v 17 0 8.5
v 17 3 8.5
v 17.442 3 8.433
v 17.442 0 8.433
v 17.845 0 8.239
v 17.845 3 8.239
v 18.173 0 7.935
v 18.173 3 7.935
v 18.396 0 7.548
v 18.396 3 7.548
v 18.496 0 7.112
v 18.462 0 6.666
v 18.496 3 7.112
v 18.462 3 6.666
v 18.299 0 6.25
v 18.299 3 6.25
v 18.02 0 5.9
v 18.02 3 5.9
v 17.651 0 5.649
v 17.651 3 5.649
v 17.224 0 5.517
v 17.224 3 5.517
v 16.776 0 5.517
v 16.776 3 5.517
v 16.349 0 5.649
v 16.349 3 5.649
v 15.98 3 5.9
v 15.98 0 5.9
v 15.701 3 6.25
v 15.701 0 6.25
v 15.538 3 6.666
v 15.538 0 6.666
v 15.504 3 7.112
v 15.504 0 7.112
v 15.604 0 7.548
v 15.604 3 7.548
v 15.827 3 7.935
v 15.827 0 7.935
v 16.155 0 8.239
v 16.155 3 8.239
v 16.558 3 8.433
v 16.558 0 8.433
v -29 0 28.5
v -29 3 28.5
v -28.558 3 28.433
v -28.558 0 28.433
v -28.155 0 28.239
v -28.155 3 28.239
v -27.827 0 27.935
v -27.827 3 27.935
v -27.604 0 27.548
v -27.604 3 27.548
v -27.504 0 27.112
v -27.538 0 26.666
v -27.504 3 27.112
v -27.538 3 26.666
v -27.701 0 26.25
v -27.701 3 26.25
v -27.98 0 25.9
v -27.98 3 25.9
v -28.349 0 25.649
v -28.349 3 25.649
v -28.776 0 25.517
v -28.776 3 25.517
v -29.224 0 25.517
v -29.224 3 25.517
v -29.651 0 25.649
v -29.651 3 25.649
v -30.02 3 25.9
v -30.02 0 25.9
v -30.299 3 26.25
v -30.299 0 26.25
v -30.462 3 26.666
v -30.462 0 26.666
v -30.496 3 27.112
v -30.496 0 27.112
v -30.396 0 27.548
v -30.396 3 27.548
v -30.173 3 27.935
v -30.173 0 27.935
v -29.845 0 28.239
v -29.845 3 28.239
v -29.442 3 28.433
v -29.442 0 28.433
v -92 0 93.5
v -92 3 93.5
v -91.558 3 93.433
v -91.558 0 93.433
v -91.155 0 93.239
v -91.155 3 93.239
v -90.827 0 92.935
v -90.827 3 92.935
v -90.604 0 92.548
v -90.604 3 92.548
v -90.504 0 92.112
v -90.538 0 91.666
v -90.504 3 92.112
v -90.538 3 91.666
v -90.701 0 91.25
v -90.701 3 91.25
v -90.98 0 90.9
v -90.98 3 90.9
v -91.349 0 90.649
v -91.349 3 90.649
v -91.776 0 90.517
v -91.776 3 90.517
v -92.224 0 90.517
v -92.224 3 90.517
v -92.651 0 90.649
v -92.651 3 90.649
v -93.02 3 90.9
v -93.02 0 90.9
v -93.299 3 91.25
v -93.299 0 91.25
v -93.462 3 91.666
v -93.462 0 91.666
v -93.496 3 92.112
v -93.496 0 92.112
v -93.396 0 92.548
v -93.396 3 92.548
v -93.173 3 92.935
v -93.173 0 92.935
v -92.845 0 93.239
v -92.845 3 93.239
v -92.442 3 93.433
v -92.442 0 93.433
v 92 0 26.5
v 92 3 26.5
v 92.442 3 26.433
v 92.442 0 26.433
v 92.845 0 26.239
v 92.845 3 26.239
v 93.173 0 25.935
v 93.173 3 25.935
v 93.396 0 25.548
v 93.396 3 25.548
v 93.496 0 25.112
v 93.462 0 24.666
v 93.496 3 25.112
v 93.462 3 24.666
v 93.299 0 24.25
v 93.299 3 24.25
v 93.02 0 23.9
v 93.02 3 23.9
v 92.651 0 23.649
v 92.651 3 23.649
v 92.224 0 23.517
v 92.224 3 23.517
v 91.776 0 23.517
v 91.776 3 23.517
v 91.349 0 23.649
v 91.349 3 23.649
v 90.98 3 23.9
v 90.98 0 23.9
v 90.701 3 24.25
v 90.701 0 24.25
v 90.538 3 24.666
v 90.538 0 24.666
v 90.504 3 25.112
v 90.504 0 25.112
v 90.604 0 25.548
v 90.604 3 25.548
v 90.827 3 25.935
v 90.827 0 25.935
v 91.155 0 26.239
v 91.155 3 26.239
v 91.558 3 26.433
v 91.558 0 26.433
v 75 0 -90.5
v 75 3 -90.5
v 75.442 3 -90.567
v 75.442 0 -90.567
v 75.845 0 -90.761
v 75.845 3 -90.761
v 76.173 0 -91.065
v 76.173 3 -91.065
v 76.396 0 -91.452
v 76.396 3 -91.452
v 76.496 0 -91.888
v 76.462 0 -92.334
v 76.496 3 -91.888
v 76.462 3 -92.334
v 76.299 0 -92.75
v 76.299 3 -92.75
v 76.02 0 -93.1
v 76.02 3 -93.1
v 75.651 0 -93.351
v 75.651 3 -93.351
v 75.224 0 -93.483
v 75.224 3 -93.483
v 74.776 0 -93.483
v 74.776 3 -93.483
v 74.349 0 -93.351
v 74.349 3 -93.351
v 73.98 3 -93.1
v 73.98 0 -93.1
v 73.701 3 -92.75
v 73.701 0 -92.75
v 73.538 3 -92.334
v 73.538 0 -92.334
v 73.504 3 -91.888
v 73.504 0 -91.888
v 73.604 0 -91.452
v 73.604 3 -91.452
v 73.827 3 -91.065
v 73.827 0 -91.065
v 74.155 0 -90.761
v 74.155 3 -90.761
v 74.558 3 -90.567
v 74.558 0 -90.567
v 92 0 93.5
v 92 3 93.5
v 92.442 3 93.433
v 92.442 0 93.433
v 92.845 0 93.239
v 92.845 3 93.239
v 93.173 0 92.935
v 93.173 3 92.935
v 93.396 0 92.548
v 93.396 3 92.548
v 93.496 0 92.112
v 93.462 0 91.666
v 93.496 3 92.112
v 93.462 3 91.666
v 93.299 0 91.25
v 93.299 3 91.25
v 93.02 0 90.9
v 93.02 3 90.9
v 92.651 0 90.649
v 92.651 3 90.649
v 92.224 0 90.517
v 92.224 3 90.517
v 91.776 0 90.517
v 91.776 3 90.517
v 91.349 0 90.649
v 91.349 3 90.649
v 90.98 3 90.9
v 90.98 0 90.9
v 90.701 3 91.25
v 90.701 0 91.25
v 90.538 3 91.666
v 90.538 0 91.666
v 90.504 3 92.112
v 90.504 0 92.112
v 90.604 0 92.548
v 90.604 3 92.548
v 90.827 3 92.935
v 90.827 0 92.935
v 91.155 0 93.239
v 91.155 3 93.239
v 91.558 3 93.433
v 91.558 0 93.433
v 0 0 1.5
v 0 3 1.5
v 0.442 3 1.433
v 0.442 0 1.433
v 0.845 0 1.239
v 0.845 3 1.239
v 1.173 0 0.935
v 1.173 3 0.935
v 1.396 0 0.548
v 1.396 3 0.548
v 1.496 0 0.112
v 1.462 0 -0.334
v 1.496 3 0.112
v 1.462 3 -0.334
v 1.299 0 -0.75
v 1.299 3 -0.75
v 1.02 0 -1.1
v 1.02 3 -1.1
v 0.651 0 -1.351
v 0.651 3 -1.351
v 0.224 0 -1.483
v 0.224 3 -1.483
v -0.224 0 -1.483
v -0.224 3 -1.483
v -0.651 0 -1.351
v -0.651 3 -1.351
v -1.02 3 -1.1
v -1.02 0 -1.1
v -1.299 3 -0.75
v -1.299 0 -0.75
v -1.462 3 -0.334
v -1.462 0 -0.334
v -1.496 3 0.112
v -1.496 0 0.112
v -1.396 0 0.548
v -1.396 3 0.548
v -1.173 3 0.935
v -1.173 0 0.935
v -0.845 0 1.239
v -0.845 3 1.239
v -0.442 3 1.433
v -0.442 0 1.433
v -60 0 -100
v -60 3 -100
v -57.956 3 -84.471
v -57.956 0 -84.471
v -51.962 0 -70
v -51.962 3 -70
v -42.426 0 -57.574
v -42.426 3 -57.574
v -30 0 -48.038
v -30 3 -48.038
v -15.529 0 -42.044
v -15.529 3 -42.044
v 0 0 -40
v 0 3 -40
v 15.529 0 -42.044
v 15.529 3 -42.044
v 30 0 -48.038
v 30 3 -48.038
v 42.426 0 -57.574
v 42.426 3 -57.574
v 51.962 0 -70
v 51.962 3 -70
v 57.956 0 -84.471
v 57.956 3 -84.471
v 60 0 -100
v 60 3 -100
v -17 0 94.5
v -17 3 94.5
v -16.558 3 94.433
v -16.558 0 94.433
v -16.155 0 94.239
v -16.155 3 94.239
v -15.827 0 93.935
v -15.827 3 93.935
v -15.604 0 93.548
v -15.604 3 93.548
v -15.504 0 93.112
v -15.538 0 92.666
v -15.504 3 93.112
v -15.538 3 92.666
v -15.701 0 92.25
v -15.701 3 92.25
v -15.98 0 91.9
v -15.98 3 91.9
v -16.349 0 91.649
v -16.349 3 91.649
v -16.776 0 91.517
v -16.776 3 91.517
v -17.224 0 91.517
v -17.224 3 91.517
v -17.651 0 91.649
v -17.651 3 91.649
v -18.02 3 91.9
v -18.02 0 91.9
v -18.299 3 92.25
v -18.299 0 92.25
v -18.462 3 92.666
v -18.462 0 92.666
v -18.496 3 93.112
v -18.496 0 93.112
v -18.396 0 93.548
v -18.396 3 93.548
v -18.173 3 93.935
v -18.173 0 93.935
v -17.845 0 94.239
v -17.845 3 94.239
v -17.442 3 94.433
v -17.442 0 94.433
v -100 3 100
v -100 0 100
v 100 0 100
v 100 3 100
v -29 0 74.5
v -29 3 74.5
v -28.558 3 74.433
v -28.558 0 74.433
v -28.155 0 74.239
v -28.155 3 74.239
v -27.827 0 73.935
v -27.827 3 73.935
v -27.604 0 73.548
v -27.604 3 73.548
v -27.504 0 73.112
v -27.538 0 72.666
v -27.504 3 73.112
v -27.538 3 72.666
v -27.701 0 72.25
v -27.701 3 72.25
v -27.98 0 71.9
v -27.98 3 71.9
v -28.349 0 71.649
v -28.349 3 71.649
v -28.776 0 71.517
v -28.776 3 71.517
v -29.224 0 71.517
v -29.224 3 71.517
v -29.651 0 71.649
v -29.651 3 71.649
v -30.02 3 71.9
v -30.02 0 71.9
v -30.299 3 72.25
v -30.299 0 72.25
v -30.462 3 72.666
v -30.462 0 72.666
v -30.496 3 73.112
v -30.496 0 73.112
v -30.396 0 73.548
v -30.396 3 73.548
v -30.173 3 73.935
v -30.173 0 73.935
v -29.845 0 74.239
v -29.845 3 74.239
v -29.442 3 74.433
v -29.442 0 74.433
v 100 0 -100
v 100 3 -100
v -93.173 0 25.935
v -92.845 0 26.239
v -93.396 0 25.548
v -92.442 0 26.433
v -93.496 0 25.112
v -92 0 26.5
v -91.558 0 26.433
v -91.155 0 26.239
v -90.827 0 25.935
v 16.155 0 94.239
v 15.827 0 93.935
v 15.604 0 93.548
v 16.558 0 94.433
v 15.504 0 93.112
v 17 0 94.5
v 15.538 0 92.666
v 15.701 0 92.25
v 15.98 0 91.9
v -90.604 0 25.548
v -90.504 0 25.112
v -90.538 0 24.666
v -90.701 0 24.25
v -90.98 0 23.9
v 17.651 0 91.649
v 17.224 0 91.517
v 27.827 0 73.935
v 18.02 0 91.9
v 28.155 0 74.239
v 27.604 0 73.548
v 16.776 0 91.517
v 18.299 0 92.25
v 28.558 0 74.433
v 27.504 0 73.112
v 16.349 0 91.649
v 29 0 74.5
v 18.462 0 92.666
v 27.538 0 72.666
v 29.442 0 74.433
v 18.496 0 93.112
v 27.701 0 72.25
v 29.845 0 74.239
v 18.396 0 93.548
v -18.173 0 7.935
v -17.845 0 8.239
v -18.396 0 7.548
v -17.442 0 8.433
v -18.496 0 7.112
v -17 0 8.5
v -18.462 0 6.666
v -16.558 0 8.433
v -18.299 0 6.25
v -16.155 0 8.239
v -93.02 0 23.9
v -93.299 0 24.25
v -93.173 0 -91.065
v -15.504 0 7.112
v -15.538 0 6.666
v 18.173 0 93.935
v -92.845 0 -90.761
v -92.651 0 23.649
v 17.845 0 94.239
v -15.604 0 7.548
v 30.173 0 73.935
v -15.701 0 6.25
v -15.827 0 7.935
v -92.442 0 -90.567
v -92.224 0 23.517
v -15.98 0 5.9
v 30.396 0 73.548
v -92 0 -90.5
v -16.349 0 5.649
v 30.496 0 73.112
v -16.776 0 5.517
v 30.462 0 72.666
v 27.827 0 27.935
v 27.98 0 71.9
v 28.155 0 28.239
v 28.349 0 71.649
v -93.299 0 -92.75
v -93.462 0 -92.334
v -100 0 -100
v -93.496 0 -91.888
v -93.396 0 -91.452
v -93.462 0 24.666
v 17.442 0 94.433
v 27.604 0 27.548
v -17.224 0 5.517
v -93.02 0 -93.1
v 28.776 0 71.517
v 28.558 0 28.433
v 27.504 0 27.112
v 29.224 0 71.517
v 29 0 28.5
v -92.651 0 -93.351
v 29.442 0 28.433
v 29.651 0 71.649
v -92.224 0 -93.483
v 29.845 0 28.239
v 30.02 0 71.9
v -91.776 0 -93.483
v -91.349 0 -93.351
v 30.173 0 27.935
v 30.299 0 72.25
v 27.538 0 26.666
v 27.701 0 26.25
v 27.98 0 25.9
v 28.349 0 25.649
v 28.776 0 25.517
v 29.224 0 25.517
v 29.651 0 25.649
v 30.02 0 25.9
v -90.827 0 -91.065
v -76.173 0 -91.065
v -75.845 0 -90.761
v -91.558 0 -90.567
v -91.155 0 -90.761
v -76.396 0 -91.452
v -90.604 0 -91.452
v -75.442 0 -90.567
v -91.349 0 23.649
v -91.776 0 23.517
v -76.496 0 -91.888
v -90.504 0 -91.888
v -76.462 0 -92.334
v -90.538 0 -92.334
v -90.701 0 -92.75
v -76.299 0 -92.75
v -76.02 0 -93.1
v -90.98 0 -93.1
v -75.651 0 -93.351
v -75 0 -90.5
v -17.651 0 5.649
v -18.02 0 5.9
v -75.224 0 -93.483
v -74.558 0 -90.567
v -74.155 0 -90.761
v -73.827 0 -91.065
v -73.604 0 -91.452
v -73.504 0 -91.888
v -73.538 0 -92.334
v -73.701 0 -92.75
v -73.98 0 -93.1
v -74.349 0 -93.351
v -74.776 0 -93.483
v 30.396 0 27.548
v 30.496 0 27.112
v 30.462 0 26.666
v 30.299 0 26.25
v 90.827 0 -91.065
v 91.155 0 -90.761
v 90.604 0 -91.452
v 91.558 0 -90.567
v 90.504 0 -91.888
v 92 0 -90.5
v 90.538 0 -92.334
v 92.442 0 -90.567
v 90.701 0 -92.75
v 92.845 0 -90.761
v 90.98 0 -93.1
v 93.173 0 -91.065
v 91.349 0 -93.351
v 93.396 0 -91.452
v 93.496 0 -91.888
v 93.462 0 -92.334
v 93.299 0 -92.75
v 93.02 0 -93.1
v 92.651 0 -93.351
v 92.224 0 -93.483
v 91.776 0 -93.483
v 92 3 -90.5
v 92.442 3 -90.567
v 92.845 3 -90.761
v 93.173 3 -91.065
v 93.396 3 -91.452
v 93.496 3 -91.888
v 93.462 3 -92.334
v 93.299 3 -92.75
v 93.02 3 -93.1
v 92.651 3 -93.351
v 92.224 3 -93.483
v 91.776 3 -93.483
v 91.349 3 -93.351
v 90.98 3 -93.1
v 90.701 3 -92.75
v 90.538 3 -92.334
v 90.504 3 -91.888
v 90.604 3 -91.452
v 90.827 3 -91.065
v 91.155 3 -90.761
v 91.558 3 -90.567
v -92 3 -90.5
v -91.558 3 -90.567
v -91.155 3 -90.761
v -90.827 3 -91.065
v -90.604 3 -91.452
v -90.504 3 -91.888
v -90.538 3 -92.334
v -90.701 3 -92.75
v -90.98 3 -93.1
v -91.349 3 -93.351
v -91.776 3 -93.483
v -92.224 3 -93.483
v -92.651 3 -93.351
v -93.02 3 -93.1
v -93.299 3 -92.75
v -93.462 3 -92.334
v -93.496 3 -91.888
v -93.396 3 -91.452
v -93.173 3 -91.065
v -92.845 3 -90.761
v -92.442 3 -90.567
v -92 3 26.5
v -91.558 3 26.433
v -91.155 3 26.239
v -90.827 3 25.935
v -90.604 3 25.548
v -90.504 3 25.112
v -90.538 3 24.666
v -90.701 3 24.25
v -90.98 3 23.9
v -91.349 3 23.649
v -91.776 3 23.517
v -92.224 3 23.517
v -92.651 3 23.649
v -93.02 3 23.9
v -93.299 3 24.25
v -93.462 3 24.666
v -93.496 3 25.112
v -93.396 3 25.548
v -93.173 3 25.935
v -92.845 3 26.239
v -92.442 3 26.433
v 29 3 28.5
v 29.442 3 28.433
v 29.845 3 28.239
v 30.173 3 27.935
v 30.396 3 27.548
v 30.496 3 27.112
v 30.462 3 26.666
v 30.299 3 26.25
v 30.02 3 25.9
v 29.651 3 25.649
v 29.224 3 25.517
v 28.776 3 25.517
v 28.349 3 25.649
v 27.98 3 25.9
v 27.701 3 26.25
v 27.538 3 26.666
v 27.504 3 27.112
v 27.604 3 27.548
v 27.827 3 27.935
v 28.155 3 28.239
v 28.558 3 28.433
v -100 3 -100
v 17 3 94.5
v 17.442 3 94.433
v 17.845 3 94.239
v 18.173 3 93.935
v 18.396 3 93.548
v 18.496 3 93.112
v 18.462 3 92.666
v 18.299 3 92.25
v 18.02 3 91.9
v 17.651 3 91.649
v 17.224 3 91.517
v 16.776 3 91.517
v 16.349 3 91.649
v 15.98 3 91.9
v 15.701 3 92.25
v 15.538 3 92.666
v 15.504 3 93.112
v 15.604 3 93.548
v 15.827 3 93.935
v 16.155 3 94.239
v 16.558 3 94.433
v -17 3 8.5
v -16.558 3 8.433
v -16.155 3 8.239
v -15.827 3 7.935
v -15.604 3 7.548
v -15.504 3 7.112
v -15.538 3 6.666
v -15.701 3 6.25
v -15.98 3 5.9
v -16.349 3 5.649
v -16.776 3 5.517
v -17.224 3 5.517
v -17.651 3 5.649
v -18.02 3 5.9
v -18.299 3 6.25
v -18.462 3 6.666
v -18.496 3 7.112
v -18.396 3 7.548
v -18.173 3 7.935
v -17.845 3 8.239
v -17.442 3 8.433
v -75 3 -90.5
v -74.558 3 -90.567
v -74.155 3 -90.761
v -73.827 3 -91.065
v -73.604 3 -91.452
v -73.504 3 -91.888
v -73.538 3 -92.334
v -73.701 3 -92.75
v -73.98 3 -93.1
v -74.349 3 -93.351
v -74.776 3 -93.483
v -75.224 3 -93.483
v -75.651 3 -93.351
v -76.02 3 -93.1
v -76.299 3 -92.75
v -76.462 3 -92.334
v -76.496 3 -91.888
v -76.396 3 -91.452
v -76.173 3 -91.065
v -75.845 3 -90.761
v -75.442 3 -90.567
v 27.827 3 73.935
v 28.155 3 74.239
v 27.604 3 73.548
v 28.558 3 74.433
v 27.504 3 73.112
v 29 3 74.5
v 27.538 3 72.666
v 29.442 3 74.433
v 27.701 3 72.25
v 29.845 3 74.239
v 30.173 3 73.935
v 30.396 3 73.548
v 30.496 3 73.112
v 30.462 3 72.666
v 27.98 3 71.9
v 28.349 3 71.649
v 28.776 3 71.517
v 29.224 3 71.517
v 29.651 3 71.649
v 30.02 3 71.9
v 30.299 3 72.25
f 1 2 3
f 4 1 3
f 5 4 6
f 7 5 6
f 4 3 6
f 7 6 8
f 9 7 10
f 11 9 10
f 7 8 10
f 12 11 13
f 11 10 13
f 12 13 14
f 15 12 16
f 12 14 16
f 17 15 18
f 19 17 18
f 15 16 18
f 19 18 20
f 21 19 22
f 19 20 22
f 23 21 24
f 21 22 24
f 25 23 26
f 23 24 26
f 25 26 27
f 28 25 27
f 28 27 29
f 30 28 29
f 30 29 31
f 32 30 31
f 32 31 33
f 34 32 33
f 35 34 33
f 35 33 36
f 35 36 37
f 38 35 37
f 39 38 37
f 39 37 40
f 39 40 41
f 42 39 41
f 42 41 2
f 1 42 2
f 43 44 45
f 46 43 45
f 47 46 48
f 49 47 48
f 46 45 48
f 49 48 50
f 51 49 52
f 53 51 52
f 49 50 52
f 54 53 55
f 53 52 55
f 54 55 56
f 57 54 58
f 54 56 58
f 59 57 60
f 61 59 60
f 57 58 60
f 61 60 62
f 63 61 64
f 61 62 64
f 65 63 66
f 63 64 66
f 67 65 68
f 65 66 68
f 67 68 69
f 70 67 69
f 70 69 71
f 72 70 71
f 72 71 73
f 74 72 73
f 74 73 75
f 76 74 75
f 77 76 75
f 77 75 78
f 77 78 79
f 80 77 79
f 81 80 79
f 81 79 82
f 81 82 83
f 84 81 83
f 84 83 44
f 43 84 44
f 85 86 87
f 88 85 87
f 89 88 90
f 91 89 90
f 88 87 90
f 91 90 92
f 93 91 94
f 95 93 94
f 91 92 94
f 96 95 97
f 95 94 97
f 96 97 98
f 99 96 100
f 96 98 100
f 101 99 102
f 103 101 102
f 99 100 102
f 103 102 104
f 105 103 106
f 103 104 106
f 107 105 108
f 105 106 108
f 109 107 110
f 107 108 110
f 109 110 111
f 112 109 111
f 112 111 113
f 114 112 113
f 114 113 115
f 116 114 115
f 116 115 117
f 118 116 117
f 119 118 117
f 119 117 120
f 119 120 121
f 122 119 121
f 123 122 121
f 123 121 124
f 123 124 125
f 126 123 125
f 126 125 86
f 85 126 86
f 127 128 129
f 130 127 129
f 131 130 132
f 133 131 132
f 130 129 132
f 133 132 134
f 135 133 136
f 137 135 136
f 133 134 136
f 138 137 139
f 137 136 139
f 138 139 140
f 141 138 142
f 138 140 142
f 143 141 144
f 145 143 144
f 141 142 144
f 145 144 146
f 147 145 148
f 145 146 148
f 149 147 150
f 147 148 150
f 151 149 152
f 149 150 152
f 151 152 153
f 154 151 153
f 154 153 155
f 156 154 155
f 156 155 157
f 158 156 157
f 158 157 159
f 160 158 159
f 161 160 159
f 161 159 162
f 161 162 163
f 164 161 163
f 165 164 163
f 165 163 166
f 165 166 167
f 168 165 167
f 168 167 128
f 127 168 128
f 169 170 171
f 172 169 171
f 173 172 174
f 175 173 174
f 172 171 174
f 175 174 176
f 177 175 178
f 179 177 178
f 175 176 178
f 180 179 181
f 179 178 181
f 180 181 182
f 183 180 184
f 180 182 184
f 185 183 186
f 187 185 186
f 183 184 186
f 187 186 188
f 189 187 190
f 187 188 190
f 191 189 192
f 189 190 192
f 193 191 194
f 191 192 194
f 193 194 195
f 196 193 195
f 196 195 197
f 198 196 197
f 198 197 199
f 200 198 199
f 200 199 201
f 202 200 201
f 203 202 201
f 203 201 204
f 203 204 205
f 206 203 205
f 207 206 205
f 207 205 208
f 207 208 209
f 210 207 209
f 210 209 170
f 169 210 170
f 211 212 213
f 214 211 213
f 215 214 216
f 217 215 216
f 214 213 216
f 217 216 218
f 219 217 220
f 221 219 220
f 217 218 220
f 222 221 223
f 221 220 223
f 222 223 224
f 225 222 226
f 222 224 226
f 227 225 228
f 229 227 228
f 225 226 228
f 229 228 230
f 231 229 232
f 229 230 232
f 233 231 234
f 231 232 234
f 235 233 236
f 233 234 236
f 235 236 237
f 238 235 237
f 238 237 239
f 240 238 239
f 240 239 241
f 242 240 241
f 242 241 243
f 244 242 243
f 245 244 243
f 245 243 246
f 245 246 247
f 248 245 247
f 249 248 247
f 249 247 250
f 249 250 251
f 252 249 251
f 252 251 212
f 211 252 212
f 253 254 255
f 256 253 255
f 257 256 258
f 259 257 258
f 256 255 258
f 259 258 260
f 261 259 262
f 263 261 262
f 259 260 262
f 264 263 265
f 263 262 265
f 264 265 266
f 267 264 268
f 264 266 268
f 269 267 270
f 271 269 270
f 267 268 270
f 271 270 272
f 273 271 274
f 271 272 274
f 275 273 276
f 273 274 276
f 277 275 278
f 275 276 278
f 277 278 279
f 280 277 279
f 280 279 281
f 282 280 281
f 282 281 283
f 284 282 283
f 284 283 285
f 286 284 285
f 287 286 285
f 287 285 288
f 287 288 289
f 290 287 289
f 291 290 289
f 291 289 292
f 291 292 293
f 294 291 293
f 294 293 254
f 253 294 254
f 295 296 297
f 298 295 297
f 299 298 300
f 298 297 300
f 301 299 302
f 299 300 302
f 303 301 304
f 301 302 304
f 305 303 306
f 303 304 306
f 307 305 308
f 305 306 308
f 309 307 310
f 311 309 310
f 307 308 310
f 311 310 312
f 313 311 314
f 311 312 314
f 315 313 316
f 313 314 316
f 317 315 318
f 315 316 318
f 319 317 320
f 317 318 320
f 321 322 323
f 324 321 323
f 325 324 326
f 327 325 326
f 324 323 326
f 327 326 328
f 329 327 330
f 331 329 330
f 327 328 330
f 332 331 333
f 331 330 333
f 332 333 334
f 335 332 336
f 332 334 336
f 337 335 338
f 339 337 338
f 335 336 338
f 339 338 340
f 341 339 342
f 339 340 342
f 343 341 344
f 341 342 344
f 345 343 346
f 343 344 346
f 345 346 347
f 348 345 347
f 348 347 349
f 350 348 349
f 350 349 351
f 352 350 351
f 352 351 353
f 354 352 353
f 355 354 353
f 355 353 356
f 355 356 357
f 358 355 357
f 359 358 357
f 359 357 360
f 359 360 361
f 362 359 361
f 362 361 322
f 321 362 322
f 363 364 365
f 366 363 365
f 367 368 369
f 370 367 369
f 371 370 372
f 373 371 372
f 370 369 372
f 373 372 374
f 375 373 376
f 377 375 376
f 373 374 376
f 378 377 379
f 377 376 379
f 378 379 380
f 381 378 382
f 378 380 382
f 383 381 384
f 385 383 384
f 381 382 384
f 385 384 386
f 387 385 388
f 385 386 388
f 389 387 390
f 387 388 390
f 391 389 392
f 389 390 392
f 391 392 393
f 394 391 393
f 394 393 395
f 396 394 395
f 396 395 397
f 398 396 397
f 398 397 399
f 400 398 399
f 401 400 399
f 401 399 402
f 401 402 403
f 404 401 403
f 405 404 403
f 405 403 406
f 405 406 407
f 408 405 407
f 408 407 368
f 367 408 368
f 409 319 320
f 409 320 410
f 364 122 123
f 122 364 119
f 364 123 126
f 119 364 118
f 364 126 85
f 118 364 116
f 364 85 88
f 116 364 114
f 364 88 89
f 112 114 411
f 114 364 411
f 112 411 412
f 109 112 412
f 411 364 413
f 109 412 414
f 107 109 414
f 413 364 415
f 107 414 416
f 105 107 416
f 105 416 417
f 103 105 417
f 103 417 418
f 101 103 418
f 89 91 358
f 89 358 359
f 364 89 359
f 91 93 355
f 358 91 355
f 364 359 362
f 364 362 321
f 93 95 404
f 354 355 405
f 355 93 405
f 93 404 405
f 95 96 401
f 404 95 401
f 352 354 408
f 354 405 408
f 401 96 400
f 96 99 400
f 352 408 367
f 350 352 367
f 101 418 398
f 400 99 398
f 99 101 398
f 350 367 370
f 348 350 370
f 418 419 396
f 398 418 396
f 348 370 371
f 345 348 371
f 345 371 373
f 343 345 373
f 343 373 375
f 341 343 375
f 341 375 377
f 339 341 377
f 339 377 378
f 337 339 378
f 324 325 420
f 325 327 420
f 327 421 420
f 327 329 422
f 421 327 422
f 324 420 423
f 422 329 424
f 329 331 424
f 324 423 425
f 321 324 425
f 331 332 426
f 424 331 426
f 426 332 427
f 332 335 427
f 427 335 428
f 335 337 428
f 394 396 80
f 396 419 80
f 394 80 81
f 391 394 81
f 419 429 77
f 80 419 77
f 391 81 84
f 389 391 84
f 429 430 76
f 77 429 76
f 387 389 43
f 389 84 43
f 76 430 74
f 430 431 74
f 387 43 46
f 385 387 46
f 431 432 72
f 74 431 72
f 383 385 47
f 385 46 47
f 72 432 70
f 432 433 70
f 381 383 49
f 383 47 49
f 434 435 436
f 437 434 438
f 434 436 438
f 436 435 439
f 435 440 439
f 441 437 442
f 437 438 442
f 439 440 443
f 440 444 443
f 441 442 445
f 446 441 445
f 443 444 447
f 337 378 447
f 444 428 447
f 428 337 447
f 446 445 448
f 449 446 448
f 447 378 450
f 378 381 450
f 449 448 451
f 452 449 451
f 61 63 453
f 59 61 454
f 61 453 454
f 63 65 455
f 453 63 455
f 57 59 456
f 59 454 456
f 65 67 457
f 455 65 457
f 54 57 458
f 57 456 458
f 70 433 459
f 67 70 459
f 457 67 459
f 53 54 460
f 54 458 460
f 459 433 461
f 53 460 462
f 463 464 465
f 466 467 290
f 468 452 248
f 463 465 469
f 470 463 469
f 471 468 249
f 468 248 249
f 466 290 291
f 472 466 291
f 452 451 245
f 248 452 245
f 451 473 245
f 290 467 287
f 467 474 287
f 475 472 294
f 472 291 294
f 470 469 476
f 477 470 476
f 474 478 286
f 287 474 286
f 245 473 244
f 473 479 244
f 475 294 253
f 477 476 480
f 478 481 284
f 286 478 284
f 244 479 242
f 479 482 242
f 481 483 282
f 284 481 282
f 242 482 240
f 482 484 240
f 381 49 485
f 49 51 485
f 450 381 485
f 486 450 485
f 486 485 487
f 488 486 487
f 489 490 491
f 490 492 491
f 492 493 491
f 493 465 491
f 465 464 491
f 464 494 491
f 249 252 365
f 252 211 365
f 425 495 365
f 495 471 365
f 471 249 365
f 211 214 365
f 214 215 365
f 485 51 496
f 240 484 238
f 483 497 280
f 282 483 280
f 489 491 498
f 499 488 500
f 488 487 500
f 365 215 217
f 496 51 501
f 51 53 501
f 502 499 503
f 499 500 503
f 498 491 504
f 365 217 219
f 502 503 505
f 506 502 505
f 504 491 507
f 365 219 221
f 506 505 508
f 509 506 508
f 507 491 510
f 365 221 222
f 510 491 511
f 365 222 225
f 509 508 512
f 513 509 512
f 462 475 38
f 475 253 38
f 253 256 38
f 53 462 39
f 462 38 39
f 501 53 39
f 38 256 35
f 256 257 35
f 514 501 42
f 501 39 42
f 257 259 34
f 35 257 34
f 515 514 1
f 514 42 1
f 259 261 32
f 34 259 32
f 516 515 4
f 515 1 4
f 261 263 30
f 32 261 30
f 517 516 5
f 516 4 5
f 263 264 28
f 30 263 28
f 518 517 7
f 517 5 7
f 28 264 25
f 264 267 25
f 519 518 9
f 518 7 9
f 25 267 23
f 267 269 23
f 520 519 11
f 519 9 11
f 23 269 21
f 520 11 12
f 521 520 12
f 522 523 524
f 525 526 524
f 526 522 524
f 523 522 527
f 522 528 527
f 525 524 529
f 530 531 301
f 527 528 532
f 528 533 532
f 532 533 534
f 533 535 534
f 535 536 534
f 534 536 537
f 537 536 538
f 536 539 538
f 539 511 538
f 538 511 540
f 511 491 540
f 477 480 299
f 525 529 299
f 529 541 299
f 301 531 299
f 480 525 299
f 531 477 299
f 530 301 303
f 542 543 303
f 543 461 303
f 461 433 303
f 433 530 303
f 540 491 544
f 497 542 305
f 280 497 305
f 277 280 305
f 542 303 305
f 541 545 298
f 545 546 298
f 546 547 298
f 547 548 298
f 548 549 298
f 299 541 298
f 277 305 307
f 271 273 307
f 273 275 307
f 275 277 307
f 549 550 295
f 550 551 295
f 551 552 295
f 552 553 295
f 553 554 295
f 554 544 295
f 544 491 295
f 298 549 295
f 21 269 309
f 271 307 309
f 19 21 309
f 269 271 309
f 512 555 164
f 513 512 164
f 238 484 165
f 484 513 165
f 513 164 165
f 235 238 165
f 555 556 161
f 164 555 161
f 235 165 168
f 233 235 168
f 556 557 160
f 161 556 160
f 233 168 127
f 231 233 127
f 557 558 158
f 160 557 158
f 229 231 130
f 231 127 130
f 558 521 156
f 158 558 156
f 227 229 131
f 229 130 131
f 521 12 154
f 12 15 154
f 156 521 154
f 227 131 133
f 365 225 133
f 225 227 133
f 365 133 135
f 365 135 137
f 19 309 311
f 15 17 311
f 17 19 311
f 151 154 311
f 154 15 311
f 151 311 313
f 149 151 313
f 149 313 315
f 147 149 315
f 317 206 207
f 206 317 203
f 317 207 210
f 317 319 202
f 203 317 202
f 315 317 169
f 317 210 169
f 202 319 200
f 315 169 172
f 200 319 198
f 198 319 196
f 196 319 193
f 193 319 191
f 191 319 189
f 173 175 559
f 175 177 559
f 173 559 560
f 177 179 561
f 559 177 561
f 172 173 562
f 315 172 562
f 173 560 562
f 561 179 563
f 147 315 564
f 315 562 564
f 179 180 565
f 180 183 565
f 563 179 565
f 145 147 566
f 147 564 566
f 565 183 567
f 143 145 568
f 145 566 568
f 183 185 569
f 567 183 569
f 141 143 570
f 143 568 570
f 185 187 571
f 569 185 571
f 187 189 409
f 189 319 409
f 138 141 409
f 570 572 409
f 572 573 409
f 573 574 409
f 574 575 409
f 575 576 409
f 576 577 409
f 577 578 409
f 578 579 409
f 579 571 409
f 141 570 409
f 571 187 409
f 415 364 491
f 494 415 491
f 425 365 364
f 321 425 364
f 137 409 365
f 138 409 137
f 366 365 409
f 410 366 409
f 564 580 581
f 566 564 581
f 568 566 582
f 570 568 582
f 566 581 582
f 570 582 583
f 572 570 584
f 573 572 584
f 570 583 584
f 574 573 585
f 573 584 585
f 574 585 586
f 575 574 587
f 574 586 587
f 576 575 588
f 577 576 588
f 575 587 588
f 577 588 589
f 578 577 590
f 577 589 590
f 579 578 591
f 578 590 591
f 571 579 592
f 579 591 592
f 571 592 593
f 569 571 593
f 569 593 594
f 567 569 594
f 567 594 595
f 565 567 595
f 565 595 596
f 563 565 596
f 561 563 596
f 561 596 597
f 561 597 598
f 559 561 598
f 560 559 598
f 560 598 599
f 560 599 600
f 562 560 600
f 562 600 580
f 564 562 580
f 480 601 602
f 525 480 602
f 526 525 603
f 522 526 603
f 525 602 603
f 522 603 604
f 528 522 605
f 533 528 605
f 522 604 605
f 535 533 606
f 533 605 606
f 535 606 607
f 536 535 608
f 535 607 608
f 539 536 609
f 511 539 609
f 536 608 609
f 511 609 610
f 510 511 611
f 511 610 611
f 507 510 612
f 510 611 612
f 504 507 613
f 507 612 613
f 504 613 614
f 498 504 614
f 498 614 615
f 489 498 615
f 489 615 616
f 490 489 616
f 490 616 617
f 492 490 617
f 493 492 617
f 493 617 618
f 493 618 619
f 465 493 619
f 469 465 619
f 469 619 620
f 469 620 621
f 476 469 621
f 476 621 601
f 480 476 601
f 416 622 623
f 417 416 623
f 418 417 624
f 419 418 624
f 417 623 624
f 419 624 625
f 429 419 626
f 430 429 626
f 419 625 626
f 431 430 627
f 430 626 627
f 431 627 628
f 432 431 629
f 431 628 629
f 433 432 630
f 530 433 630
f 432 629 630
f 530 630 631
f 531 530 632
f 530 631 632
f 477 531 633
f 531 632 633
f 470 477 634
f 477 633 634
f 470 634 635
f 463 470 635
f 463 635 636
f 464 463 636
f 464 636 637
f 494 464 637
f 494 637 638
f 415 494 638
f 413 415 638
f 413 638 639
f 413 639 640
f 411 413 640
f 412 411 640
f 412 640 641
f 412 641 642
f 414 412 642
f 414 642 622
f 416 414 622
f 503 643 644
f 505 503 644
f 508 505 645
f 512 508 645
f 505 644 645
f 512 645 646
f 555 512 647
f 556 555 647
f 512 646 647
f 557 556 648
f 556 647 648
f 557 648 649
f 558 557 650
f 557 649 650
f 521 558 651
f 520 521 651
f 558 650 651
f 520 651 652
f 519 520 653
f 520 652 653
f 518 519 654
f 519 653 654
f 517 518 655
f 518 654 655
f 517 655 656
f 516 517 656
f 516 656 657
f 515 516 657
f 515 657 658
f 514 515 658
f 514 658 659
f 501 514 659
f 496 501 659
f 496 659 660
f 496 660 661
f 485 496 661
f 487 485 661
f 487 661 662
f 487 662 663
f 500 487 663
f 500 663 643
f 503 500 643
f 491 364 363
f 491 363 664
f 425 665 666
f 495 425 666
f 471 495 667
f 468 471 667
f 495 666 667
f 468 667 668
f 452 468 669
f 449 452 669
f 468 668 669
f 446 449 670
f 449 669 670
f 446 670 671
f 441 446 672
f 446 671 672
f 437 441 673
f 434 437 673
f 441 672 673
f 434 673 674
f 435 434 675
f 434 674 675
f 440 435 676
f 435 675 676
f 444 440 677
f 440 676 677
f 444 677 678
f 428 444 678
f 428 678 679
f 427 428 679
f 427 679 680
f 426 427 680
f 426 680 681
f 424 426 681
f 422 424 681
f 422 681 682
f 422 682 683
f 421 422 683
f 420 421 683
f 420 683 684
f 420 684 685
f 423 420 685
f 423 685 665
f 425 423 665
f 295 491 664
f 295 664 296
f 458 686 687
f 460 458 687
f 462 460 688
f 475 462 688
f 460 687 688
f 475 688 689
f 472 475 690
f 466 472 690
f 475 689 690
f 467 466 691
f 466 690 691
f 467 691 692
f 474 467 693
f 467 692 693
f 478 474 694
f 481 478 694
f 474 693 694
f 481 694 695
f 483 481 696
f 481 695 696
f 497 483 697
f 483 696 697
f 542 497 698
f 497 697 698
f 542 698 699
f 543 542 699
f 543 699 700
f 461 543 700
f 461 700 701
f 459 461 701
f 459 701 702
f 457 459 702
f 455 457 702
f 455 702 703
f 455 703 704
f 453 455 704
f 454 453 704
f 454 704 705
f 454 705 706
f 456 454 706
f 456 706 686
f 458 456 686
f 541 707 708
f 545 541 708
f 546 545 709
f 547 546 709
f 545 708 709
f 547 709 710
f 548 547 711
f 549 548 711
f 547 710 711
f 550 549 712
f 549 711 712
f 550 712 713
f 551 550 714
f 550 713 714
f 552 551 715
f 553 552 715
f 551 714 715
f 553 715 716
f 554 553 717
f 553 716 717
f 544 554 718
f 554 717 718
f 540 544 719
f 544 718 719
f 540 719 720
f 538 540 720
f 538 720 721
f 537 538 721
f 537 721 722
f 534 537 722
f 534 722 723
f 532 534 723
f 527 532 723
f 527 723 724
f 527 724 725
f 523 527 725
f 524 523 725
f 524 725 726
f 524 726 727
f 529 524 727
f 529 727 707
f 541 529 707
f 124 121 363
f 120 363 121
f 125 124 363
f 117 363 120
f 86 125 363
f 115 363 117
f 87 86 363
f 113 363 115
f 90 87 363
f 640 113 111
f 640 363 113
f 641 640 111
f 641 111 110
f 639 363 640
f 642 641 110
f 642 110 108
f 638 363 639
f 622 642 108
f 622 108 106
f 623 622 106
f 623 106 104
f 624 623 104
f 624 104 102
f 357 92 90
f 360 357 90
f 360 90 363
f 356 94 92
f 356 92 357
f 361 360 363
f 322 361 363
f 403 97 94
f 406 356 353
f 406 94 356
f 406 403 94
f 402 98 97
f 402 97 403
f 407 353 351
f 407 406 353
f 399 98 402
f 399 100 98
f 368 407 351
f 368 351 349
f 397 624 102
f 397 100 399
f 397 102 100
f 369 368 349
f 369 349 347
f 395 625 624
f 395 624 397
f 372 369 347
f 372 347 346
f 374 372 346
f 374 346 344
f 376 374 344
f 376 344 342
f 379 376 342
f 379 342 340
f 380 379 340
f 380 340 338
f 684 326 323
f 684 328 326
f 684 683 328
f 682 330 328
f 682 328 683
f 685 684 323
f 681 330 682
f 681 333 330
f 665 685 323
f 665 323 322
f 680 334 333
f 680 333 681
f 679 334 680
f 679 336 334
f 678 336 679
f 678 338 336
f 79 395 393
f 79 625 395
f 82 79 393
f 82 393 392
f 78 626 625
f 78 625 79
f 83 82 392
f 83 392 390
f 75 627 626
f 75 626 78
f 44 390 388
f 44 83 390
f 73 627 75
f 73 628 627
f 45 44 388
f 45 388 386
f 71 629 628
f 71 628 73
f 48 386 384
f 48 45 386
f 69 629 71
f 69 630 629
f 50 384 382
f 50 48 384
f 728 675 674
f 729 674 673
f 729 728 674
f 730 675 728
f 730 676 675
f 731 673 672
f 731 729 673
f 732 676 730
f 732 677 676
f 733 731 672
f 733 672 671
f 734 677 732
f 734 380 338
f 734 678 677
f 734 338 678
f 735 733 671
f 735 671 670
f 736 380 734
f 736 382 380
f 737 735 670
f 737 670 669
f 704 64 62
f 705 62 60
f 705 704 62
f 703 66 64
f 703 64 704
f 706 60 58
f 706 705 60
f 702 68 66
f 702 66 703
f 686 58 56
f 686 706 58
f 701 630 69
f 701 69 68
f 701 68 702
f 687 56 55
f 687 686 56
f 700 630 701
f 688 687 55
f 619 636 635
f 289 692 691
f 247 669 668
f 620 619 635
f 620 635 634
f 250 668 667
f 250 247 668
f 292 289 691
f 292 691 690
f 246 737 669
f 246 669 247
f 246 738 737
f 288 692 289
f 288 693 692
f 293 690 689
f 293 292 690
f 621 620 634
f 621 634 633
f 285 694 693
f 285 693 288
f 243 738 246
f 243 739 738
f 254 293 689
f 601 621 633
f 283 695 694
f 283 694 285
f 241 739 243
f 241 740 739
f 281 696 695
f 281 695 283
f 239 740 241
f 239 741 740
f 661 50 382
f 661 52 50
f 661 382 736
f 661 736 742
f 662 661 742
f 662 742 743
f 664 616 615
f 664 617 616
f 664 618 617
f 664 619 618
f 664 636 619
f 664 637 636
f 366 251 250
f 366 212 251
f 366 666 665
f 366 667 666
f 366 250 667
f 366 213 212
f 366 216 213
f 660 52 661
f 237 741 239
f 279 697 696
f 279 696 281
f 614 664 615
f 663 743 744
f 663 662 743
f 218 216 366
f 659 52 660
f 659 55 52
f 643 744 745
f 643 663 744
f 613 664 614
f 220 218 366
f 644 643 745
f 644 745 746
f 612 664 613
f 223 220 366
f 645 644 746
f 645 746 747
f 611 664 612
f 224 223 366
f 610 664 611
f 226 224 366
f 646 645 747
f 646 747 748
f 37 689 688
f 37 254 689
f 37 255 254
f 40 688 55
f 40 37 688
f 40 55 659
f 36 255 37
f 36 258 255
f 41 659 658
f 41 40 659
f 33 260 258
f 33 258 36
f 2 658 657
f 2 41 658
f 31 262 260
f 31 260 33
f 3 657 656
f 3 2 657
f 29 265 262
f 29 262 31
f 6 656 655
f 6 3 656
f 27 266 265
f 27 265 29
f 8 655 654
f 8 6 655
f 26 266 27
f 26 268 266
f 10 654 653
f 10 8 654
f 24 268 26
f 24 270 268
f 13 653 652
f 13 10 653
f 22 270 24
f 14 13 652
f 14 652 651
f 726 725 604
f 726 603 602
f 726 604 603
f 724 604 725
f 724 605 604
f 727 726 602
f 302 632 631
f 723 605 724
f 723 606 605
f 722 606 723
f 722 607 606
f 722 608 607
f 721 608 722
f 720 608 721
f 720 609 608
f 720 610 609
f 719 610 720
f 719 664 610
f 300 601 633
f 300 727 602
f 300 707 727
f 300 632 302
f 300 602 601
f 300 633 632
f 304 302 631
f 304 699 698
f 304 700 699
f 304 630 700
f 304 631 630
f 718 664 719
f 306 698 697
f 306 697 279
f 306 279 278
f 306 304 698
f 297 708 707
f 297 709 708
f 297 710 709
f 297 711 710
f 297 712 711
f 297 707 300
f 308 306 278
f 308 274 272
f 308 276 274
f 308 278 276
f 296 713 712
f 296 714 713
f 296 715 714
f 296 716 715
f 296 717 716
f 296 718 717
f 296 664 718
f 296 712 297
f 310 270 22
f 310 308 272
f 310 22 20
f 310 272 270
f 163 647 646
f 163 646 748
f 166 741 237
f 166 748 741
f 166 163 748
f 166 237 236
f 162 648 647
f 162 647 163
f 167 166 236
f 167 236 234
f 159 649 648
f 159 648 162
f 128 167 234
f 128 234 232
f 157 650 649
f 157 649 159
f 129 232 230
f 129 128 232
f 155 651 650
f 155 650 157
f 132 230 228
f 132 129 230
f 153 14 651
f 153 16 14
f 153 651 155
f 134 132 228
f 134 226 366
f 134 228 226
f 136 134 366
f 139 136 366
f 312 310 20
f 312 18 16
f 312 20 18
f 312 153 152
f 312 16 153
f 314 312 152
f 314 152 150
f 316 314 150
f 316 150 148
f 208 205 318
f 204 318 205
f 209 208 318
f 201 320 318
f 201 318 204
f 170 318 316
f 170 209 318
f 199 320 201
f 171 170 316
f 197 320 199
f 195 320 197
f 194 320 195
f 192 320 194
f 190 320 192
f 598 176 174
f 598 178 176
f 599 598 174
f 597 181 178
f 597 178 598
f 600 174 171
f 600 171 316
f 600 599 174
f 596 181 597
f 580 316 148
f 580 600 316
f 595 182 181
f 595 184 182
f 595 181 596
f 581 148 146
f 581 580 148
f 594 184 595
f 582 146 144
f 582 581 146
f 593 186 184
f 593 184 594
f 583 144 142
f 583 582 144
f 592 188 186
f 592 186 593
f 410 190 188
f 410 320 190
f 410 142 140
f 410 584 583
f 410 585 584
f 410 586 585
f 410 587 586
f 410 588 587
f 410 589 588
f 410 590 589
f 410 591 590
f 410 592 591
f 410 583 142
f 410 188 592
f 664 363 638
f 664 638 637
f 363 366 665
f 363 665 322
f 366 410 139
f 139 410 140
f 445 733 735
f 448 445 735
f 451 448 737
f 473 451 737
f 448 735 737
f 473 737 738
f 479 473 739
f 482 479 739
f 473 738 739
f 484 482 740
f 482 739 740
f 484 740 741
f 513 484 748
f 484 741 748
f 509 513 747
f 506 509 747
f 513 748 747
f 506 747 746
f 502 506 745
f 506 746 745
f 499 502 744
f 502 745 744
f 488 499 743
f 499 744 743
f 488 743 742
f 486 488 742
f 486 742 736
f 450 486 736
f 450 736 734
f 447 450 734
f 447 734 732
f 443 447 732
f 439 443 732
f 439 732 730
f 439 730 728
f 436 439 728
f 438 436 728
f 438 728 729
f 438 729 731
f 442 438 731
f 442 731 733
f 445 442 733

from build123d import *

# Parameters (mm, degrees)
SKETCH3_W           = 200
SKETCH3_H           = 200
BOSS_EXTRUDE1_DEPTH = 3
SKETCH4_R           = 1.5
SKETCH4_R_2         = 60
CUT_EXTRUDE1_DEPTH  = 5


with BuildPart() as part:
    # Sketch3 → Boss-Extrude1 (new body)
    with BuildSketch(Plane(origin=(0, 0, 0), x_dir=(1, 0, 0), z_dir=(0, 1, 0))):
        Rectangle(SKETCH3_W, SKETCH3_H)
    extrude(amount=BOSS_EXTRUDE1_DEPTH)

    # Sketch4 → Cut-Extrude1 (cut)
    with BuildSketch(Plane(origin=(0, 3, 0), x_dir=(1, 0, 0), z_dir=(0, 1, 0))):
        with Locations(Location((92, 92, 0), (0, 0, 270))):
            Circle(SKETCH4_R)
        with Locations(Location((92, -92, 0), (0, 0, 270))):
            Circle(SKETCH4_R)
        with Locations(Location((-92, -92, 0), (0, 0, 270))):
            Circle(SKETCH4_R)
        with Locations(Location((-92, 92, 0), (0, 0, 270))):
            Circle(SKETCH4_R)
        with Locations(Location((92, -25, 0), (0, 0, 270))):
            Circle(SKETCH4_R)
        with Locations(Location((17, -93, 0), (0, 0, 270))):
            Circle(SKETCH4_R)
        with Locations(Location((29, -73, 0), (0, 0, 270))):
            Circle(SKETCH4_R)
        with Locations(Location((75, 92, 0), (0, 0, 270))):
            Circle(SKETCH4_R)
        with Locations(Location((29, -27, 0), (0, 0, 270))):
            Circle(SKETCH4_R)
        with Locations(Location((17, -7, 0), (0, 0, 270))):
            Circle(SKETCH4_R)
        with Locations(Location((-92, -25, 0), (0, 0, 270))):
            Circle(SKETCH4_R)
        with Locations(Location((-17, -93, 0), (0, 0, 270))):
            Circle(SKETCH4_R)
        with Locations(Location((-29, -73, 0), (0, 0, 270))):
            Circle(SKETCH4_R)
        with Locations(Location((-29, -27, 0), (0, 0, 270))):
            Circle(SKETCH4_R)
        with Locations(Location((-17, -7, 0), (0, 0, 270))):
            Circle(SKETCH4_R)
        with Locations((0, 100)):
            Circle(SKETCH4_R_2)
        with Locations(Location((-75, 92, 0), (0, 0, 270))):
            Circle(SKETCH4_R)
        with Locations(Location((0, 0, 0), (0, 0, 270))):
            Circle(SKETCH4_R)
    extrude(amount=-CUT_EXTRUDE1_DEPTH, mode=Mode.SUBTRACT)


solid = part.part
